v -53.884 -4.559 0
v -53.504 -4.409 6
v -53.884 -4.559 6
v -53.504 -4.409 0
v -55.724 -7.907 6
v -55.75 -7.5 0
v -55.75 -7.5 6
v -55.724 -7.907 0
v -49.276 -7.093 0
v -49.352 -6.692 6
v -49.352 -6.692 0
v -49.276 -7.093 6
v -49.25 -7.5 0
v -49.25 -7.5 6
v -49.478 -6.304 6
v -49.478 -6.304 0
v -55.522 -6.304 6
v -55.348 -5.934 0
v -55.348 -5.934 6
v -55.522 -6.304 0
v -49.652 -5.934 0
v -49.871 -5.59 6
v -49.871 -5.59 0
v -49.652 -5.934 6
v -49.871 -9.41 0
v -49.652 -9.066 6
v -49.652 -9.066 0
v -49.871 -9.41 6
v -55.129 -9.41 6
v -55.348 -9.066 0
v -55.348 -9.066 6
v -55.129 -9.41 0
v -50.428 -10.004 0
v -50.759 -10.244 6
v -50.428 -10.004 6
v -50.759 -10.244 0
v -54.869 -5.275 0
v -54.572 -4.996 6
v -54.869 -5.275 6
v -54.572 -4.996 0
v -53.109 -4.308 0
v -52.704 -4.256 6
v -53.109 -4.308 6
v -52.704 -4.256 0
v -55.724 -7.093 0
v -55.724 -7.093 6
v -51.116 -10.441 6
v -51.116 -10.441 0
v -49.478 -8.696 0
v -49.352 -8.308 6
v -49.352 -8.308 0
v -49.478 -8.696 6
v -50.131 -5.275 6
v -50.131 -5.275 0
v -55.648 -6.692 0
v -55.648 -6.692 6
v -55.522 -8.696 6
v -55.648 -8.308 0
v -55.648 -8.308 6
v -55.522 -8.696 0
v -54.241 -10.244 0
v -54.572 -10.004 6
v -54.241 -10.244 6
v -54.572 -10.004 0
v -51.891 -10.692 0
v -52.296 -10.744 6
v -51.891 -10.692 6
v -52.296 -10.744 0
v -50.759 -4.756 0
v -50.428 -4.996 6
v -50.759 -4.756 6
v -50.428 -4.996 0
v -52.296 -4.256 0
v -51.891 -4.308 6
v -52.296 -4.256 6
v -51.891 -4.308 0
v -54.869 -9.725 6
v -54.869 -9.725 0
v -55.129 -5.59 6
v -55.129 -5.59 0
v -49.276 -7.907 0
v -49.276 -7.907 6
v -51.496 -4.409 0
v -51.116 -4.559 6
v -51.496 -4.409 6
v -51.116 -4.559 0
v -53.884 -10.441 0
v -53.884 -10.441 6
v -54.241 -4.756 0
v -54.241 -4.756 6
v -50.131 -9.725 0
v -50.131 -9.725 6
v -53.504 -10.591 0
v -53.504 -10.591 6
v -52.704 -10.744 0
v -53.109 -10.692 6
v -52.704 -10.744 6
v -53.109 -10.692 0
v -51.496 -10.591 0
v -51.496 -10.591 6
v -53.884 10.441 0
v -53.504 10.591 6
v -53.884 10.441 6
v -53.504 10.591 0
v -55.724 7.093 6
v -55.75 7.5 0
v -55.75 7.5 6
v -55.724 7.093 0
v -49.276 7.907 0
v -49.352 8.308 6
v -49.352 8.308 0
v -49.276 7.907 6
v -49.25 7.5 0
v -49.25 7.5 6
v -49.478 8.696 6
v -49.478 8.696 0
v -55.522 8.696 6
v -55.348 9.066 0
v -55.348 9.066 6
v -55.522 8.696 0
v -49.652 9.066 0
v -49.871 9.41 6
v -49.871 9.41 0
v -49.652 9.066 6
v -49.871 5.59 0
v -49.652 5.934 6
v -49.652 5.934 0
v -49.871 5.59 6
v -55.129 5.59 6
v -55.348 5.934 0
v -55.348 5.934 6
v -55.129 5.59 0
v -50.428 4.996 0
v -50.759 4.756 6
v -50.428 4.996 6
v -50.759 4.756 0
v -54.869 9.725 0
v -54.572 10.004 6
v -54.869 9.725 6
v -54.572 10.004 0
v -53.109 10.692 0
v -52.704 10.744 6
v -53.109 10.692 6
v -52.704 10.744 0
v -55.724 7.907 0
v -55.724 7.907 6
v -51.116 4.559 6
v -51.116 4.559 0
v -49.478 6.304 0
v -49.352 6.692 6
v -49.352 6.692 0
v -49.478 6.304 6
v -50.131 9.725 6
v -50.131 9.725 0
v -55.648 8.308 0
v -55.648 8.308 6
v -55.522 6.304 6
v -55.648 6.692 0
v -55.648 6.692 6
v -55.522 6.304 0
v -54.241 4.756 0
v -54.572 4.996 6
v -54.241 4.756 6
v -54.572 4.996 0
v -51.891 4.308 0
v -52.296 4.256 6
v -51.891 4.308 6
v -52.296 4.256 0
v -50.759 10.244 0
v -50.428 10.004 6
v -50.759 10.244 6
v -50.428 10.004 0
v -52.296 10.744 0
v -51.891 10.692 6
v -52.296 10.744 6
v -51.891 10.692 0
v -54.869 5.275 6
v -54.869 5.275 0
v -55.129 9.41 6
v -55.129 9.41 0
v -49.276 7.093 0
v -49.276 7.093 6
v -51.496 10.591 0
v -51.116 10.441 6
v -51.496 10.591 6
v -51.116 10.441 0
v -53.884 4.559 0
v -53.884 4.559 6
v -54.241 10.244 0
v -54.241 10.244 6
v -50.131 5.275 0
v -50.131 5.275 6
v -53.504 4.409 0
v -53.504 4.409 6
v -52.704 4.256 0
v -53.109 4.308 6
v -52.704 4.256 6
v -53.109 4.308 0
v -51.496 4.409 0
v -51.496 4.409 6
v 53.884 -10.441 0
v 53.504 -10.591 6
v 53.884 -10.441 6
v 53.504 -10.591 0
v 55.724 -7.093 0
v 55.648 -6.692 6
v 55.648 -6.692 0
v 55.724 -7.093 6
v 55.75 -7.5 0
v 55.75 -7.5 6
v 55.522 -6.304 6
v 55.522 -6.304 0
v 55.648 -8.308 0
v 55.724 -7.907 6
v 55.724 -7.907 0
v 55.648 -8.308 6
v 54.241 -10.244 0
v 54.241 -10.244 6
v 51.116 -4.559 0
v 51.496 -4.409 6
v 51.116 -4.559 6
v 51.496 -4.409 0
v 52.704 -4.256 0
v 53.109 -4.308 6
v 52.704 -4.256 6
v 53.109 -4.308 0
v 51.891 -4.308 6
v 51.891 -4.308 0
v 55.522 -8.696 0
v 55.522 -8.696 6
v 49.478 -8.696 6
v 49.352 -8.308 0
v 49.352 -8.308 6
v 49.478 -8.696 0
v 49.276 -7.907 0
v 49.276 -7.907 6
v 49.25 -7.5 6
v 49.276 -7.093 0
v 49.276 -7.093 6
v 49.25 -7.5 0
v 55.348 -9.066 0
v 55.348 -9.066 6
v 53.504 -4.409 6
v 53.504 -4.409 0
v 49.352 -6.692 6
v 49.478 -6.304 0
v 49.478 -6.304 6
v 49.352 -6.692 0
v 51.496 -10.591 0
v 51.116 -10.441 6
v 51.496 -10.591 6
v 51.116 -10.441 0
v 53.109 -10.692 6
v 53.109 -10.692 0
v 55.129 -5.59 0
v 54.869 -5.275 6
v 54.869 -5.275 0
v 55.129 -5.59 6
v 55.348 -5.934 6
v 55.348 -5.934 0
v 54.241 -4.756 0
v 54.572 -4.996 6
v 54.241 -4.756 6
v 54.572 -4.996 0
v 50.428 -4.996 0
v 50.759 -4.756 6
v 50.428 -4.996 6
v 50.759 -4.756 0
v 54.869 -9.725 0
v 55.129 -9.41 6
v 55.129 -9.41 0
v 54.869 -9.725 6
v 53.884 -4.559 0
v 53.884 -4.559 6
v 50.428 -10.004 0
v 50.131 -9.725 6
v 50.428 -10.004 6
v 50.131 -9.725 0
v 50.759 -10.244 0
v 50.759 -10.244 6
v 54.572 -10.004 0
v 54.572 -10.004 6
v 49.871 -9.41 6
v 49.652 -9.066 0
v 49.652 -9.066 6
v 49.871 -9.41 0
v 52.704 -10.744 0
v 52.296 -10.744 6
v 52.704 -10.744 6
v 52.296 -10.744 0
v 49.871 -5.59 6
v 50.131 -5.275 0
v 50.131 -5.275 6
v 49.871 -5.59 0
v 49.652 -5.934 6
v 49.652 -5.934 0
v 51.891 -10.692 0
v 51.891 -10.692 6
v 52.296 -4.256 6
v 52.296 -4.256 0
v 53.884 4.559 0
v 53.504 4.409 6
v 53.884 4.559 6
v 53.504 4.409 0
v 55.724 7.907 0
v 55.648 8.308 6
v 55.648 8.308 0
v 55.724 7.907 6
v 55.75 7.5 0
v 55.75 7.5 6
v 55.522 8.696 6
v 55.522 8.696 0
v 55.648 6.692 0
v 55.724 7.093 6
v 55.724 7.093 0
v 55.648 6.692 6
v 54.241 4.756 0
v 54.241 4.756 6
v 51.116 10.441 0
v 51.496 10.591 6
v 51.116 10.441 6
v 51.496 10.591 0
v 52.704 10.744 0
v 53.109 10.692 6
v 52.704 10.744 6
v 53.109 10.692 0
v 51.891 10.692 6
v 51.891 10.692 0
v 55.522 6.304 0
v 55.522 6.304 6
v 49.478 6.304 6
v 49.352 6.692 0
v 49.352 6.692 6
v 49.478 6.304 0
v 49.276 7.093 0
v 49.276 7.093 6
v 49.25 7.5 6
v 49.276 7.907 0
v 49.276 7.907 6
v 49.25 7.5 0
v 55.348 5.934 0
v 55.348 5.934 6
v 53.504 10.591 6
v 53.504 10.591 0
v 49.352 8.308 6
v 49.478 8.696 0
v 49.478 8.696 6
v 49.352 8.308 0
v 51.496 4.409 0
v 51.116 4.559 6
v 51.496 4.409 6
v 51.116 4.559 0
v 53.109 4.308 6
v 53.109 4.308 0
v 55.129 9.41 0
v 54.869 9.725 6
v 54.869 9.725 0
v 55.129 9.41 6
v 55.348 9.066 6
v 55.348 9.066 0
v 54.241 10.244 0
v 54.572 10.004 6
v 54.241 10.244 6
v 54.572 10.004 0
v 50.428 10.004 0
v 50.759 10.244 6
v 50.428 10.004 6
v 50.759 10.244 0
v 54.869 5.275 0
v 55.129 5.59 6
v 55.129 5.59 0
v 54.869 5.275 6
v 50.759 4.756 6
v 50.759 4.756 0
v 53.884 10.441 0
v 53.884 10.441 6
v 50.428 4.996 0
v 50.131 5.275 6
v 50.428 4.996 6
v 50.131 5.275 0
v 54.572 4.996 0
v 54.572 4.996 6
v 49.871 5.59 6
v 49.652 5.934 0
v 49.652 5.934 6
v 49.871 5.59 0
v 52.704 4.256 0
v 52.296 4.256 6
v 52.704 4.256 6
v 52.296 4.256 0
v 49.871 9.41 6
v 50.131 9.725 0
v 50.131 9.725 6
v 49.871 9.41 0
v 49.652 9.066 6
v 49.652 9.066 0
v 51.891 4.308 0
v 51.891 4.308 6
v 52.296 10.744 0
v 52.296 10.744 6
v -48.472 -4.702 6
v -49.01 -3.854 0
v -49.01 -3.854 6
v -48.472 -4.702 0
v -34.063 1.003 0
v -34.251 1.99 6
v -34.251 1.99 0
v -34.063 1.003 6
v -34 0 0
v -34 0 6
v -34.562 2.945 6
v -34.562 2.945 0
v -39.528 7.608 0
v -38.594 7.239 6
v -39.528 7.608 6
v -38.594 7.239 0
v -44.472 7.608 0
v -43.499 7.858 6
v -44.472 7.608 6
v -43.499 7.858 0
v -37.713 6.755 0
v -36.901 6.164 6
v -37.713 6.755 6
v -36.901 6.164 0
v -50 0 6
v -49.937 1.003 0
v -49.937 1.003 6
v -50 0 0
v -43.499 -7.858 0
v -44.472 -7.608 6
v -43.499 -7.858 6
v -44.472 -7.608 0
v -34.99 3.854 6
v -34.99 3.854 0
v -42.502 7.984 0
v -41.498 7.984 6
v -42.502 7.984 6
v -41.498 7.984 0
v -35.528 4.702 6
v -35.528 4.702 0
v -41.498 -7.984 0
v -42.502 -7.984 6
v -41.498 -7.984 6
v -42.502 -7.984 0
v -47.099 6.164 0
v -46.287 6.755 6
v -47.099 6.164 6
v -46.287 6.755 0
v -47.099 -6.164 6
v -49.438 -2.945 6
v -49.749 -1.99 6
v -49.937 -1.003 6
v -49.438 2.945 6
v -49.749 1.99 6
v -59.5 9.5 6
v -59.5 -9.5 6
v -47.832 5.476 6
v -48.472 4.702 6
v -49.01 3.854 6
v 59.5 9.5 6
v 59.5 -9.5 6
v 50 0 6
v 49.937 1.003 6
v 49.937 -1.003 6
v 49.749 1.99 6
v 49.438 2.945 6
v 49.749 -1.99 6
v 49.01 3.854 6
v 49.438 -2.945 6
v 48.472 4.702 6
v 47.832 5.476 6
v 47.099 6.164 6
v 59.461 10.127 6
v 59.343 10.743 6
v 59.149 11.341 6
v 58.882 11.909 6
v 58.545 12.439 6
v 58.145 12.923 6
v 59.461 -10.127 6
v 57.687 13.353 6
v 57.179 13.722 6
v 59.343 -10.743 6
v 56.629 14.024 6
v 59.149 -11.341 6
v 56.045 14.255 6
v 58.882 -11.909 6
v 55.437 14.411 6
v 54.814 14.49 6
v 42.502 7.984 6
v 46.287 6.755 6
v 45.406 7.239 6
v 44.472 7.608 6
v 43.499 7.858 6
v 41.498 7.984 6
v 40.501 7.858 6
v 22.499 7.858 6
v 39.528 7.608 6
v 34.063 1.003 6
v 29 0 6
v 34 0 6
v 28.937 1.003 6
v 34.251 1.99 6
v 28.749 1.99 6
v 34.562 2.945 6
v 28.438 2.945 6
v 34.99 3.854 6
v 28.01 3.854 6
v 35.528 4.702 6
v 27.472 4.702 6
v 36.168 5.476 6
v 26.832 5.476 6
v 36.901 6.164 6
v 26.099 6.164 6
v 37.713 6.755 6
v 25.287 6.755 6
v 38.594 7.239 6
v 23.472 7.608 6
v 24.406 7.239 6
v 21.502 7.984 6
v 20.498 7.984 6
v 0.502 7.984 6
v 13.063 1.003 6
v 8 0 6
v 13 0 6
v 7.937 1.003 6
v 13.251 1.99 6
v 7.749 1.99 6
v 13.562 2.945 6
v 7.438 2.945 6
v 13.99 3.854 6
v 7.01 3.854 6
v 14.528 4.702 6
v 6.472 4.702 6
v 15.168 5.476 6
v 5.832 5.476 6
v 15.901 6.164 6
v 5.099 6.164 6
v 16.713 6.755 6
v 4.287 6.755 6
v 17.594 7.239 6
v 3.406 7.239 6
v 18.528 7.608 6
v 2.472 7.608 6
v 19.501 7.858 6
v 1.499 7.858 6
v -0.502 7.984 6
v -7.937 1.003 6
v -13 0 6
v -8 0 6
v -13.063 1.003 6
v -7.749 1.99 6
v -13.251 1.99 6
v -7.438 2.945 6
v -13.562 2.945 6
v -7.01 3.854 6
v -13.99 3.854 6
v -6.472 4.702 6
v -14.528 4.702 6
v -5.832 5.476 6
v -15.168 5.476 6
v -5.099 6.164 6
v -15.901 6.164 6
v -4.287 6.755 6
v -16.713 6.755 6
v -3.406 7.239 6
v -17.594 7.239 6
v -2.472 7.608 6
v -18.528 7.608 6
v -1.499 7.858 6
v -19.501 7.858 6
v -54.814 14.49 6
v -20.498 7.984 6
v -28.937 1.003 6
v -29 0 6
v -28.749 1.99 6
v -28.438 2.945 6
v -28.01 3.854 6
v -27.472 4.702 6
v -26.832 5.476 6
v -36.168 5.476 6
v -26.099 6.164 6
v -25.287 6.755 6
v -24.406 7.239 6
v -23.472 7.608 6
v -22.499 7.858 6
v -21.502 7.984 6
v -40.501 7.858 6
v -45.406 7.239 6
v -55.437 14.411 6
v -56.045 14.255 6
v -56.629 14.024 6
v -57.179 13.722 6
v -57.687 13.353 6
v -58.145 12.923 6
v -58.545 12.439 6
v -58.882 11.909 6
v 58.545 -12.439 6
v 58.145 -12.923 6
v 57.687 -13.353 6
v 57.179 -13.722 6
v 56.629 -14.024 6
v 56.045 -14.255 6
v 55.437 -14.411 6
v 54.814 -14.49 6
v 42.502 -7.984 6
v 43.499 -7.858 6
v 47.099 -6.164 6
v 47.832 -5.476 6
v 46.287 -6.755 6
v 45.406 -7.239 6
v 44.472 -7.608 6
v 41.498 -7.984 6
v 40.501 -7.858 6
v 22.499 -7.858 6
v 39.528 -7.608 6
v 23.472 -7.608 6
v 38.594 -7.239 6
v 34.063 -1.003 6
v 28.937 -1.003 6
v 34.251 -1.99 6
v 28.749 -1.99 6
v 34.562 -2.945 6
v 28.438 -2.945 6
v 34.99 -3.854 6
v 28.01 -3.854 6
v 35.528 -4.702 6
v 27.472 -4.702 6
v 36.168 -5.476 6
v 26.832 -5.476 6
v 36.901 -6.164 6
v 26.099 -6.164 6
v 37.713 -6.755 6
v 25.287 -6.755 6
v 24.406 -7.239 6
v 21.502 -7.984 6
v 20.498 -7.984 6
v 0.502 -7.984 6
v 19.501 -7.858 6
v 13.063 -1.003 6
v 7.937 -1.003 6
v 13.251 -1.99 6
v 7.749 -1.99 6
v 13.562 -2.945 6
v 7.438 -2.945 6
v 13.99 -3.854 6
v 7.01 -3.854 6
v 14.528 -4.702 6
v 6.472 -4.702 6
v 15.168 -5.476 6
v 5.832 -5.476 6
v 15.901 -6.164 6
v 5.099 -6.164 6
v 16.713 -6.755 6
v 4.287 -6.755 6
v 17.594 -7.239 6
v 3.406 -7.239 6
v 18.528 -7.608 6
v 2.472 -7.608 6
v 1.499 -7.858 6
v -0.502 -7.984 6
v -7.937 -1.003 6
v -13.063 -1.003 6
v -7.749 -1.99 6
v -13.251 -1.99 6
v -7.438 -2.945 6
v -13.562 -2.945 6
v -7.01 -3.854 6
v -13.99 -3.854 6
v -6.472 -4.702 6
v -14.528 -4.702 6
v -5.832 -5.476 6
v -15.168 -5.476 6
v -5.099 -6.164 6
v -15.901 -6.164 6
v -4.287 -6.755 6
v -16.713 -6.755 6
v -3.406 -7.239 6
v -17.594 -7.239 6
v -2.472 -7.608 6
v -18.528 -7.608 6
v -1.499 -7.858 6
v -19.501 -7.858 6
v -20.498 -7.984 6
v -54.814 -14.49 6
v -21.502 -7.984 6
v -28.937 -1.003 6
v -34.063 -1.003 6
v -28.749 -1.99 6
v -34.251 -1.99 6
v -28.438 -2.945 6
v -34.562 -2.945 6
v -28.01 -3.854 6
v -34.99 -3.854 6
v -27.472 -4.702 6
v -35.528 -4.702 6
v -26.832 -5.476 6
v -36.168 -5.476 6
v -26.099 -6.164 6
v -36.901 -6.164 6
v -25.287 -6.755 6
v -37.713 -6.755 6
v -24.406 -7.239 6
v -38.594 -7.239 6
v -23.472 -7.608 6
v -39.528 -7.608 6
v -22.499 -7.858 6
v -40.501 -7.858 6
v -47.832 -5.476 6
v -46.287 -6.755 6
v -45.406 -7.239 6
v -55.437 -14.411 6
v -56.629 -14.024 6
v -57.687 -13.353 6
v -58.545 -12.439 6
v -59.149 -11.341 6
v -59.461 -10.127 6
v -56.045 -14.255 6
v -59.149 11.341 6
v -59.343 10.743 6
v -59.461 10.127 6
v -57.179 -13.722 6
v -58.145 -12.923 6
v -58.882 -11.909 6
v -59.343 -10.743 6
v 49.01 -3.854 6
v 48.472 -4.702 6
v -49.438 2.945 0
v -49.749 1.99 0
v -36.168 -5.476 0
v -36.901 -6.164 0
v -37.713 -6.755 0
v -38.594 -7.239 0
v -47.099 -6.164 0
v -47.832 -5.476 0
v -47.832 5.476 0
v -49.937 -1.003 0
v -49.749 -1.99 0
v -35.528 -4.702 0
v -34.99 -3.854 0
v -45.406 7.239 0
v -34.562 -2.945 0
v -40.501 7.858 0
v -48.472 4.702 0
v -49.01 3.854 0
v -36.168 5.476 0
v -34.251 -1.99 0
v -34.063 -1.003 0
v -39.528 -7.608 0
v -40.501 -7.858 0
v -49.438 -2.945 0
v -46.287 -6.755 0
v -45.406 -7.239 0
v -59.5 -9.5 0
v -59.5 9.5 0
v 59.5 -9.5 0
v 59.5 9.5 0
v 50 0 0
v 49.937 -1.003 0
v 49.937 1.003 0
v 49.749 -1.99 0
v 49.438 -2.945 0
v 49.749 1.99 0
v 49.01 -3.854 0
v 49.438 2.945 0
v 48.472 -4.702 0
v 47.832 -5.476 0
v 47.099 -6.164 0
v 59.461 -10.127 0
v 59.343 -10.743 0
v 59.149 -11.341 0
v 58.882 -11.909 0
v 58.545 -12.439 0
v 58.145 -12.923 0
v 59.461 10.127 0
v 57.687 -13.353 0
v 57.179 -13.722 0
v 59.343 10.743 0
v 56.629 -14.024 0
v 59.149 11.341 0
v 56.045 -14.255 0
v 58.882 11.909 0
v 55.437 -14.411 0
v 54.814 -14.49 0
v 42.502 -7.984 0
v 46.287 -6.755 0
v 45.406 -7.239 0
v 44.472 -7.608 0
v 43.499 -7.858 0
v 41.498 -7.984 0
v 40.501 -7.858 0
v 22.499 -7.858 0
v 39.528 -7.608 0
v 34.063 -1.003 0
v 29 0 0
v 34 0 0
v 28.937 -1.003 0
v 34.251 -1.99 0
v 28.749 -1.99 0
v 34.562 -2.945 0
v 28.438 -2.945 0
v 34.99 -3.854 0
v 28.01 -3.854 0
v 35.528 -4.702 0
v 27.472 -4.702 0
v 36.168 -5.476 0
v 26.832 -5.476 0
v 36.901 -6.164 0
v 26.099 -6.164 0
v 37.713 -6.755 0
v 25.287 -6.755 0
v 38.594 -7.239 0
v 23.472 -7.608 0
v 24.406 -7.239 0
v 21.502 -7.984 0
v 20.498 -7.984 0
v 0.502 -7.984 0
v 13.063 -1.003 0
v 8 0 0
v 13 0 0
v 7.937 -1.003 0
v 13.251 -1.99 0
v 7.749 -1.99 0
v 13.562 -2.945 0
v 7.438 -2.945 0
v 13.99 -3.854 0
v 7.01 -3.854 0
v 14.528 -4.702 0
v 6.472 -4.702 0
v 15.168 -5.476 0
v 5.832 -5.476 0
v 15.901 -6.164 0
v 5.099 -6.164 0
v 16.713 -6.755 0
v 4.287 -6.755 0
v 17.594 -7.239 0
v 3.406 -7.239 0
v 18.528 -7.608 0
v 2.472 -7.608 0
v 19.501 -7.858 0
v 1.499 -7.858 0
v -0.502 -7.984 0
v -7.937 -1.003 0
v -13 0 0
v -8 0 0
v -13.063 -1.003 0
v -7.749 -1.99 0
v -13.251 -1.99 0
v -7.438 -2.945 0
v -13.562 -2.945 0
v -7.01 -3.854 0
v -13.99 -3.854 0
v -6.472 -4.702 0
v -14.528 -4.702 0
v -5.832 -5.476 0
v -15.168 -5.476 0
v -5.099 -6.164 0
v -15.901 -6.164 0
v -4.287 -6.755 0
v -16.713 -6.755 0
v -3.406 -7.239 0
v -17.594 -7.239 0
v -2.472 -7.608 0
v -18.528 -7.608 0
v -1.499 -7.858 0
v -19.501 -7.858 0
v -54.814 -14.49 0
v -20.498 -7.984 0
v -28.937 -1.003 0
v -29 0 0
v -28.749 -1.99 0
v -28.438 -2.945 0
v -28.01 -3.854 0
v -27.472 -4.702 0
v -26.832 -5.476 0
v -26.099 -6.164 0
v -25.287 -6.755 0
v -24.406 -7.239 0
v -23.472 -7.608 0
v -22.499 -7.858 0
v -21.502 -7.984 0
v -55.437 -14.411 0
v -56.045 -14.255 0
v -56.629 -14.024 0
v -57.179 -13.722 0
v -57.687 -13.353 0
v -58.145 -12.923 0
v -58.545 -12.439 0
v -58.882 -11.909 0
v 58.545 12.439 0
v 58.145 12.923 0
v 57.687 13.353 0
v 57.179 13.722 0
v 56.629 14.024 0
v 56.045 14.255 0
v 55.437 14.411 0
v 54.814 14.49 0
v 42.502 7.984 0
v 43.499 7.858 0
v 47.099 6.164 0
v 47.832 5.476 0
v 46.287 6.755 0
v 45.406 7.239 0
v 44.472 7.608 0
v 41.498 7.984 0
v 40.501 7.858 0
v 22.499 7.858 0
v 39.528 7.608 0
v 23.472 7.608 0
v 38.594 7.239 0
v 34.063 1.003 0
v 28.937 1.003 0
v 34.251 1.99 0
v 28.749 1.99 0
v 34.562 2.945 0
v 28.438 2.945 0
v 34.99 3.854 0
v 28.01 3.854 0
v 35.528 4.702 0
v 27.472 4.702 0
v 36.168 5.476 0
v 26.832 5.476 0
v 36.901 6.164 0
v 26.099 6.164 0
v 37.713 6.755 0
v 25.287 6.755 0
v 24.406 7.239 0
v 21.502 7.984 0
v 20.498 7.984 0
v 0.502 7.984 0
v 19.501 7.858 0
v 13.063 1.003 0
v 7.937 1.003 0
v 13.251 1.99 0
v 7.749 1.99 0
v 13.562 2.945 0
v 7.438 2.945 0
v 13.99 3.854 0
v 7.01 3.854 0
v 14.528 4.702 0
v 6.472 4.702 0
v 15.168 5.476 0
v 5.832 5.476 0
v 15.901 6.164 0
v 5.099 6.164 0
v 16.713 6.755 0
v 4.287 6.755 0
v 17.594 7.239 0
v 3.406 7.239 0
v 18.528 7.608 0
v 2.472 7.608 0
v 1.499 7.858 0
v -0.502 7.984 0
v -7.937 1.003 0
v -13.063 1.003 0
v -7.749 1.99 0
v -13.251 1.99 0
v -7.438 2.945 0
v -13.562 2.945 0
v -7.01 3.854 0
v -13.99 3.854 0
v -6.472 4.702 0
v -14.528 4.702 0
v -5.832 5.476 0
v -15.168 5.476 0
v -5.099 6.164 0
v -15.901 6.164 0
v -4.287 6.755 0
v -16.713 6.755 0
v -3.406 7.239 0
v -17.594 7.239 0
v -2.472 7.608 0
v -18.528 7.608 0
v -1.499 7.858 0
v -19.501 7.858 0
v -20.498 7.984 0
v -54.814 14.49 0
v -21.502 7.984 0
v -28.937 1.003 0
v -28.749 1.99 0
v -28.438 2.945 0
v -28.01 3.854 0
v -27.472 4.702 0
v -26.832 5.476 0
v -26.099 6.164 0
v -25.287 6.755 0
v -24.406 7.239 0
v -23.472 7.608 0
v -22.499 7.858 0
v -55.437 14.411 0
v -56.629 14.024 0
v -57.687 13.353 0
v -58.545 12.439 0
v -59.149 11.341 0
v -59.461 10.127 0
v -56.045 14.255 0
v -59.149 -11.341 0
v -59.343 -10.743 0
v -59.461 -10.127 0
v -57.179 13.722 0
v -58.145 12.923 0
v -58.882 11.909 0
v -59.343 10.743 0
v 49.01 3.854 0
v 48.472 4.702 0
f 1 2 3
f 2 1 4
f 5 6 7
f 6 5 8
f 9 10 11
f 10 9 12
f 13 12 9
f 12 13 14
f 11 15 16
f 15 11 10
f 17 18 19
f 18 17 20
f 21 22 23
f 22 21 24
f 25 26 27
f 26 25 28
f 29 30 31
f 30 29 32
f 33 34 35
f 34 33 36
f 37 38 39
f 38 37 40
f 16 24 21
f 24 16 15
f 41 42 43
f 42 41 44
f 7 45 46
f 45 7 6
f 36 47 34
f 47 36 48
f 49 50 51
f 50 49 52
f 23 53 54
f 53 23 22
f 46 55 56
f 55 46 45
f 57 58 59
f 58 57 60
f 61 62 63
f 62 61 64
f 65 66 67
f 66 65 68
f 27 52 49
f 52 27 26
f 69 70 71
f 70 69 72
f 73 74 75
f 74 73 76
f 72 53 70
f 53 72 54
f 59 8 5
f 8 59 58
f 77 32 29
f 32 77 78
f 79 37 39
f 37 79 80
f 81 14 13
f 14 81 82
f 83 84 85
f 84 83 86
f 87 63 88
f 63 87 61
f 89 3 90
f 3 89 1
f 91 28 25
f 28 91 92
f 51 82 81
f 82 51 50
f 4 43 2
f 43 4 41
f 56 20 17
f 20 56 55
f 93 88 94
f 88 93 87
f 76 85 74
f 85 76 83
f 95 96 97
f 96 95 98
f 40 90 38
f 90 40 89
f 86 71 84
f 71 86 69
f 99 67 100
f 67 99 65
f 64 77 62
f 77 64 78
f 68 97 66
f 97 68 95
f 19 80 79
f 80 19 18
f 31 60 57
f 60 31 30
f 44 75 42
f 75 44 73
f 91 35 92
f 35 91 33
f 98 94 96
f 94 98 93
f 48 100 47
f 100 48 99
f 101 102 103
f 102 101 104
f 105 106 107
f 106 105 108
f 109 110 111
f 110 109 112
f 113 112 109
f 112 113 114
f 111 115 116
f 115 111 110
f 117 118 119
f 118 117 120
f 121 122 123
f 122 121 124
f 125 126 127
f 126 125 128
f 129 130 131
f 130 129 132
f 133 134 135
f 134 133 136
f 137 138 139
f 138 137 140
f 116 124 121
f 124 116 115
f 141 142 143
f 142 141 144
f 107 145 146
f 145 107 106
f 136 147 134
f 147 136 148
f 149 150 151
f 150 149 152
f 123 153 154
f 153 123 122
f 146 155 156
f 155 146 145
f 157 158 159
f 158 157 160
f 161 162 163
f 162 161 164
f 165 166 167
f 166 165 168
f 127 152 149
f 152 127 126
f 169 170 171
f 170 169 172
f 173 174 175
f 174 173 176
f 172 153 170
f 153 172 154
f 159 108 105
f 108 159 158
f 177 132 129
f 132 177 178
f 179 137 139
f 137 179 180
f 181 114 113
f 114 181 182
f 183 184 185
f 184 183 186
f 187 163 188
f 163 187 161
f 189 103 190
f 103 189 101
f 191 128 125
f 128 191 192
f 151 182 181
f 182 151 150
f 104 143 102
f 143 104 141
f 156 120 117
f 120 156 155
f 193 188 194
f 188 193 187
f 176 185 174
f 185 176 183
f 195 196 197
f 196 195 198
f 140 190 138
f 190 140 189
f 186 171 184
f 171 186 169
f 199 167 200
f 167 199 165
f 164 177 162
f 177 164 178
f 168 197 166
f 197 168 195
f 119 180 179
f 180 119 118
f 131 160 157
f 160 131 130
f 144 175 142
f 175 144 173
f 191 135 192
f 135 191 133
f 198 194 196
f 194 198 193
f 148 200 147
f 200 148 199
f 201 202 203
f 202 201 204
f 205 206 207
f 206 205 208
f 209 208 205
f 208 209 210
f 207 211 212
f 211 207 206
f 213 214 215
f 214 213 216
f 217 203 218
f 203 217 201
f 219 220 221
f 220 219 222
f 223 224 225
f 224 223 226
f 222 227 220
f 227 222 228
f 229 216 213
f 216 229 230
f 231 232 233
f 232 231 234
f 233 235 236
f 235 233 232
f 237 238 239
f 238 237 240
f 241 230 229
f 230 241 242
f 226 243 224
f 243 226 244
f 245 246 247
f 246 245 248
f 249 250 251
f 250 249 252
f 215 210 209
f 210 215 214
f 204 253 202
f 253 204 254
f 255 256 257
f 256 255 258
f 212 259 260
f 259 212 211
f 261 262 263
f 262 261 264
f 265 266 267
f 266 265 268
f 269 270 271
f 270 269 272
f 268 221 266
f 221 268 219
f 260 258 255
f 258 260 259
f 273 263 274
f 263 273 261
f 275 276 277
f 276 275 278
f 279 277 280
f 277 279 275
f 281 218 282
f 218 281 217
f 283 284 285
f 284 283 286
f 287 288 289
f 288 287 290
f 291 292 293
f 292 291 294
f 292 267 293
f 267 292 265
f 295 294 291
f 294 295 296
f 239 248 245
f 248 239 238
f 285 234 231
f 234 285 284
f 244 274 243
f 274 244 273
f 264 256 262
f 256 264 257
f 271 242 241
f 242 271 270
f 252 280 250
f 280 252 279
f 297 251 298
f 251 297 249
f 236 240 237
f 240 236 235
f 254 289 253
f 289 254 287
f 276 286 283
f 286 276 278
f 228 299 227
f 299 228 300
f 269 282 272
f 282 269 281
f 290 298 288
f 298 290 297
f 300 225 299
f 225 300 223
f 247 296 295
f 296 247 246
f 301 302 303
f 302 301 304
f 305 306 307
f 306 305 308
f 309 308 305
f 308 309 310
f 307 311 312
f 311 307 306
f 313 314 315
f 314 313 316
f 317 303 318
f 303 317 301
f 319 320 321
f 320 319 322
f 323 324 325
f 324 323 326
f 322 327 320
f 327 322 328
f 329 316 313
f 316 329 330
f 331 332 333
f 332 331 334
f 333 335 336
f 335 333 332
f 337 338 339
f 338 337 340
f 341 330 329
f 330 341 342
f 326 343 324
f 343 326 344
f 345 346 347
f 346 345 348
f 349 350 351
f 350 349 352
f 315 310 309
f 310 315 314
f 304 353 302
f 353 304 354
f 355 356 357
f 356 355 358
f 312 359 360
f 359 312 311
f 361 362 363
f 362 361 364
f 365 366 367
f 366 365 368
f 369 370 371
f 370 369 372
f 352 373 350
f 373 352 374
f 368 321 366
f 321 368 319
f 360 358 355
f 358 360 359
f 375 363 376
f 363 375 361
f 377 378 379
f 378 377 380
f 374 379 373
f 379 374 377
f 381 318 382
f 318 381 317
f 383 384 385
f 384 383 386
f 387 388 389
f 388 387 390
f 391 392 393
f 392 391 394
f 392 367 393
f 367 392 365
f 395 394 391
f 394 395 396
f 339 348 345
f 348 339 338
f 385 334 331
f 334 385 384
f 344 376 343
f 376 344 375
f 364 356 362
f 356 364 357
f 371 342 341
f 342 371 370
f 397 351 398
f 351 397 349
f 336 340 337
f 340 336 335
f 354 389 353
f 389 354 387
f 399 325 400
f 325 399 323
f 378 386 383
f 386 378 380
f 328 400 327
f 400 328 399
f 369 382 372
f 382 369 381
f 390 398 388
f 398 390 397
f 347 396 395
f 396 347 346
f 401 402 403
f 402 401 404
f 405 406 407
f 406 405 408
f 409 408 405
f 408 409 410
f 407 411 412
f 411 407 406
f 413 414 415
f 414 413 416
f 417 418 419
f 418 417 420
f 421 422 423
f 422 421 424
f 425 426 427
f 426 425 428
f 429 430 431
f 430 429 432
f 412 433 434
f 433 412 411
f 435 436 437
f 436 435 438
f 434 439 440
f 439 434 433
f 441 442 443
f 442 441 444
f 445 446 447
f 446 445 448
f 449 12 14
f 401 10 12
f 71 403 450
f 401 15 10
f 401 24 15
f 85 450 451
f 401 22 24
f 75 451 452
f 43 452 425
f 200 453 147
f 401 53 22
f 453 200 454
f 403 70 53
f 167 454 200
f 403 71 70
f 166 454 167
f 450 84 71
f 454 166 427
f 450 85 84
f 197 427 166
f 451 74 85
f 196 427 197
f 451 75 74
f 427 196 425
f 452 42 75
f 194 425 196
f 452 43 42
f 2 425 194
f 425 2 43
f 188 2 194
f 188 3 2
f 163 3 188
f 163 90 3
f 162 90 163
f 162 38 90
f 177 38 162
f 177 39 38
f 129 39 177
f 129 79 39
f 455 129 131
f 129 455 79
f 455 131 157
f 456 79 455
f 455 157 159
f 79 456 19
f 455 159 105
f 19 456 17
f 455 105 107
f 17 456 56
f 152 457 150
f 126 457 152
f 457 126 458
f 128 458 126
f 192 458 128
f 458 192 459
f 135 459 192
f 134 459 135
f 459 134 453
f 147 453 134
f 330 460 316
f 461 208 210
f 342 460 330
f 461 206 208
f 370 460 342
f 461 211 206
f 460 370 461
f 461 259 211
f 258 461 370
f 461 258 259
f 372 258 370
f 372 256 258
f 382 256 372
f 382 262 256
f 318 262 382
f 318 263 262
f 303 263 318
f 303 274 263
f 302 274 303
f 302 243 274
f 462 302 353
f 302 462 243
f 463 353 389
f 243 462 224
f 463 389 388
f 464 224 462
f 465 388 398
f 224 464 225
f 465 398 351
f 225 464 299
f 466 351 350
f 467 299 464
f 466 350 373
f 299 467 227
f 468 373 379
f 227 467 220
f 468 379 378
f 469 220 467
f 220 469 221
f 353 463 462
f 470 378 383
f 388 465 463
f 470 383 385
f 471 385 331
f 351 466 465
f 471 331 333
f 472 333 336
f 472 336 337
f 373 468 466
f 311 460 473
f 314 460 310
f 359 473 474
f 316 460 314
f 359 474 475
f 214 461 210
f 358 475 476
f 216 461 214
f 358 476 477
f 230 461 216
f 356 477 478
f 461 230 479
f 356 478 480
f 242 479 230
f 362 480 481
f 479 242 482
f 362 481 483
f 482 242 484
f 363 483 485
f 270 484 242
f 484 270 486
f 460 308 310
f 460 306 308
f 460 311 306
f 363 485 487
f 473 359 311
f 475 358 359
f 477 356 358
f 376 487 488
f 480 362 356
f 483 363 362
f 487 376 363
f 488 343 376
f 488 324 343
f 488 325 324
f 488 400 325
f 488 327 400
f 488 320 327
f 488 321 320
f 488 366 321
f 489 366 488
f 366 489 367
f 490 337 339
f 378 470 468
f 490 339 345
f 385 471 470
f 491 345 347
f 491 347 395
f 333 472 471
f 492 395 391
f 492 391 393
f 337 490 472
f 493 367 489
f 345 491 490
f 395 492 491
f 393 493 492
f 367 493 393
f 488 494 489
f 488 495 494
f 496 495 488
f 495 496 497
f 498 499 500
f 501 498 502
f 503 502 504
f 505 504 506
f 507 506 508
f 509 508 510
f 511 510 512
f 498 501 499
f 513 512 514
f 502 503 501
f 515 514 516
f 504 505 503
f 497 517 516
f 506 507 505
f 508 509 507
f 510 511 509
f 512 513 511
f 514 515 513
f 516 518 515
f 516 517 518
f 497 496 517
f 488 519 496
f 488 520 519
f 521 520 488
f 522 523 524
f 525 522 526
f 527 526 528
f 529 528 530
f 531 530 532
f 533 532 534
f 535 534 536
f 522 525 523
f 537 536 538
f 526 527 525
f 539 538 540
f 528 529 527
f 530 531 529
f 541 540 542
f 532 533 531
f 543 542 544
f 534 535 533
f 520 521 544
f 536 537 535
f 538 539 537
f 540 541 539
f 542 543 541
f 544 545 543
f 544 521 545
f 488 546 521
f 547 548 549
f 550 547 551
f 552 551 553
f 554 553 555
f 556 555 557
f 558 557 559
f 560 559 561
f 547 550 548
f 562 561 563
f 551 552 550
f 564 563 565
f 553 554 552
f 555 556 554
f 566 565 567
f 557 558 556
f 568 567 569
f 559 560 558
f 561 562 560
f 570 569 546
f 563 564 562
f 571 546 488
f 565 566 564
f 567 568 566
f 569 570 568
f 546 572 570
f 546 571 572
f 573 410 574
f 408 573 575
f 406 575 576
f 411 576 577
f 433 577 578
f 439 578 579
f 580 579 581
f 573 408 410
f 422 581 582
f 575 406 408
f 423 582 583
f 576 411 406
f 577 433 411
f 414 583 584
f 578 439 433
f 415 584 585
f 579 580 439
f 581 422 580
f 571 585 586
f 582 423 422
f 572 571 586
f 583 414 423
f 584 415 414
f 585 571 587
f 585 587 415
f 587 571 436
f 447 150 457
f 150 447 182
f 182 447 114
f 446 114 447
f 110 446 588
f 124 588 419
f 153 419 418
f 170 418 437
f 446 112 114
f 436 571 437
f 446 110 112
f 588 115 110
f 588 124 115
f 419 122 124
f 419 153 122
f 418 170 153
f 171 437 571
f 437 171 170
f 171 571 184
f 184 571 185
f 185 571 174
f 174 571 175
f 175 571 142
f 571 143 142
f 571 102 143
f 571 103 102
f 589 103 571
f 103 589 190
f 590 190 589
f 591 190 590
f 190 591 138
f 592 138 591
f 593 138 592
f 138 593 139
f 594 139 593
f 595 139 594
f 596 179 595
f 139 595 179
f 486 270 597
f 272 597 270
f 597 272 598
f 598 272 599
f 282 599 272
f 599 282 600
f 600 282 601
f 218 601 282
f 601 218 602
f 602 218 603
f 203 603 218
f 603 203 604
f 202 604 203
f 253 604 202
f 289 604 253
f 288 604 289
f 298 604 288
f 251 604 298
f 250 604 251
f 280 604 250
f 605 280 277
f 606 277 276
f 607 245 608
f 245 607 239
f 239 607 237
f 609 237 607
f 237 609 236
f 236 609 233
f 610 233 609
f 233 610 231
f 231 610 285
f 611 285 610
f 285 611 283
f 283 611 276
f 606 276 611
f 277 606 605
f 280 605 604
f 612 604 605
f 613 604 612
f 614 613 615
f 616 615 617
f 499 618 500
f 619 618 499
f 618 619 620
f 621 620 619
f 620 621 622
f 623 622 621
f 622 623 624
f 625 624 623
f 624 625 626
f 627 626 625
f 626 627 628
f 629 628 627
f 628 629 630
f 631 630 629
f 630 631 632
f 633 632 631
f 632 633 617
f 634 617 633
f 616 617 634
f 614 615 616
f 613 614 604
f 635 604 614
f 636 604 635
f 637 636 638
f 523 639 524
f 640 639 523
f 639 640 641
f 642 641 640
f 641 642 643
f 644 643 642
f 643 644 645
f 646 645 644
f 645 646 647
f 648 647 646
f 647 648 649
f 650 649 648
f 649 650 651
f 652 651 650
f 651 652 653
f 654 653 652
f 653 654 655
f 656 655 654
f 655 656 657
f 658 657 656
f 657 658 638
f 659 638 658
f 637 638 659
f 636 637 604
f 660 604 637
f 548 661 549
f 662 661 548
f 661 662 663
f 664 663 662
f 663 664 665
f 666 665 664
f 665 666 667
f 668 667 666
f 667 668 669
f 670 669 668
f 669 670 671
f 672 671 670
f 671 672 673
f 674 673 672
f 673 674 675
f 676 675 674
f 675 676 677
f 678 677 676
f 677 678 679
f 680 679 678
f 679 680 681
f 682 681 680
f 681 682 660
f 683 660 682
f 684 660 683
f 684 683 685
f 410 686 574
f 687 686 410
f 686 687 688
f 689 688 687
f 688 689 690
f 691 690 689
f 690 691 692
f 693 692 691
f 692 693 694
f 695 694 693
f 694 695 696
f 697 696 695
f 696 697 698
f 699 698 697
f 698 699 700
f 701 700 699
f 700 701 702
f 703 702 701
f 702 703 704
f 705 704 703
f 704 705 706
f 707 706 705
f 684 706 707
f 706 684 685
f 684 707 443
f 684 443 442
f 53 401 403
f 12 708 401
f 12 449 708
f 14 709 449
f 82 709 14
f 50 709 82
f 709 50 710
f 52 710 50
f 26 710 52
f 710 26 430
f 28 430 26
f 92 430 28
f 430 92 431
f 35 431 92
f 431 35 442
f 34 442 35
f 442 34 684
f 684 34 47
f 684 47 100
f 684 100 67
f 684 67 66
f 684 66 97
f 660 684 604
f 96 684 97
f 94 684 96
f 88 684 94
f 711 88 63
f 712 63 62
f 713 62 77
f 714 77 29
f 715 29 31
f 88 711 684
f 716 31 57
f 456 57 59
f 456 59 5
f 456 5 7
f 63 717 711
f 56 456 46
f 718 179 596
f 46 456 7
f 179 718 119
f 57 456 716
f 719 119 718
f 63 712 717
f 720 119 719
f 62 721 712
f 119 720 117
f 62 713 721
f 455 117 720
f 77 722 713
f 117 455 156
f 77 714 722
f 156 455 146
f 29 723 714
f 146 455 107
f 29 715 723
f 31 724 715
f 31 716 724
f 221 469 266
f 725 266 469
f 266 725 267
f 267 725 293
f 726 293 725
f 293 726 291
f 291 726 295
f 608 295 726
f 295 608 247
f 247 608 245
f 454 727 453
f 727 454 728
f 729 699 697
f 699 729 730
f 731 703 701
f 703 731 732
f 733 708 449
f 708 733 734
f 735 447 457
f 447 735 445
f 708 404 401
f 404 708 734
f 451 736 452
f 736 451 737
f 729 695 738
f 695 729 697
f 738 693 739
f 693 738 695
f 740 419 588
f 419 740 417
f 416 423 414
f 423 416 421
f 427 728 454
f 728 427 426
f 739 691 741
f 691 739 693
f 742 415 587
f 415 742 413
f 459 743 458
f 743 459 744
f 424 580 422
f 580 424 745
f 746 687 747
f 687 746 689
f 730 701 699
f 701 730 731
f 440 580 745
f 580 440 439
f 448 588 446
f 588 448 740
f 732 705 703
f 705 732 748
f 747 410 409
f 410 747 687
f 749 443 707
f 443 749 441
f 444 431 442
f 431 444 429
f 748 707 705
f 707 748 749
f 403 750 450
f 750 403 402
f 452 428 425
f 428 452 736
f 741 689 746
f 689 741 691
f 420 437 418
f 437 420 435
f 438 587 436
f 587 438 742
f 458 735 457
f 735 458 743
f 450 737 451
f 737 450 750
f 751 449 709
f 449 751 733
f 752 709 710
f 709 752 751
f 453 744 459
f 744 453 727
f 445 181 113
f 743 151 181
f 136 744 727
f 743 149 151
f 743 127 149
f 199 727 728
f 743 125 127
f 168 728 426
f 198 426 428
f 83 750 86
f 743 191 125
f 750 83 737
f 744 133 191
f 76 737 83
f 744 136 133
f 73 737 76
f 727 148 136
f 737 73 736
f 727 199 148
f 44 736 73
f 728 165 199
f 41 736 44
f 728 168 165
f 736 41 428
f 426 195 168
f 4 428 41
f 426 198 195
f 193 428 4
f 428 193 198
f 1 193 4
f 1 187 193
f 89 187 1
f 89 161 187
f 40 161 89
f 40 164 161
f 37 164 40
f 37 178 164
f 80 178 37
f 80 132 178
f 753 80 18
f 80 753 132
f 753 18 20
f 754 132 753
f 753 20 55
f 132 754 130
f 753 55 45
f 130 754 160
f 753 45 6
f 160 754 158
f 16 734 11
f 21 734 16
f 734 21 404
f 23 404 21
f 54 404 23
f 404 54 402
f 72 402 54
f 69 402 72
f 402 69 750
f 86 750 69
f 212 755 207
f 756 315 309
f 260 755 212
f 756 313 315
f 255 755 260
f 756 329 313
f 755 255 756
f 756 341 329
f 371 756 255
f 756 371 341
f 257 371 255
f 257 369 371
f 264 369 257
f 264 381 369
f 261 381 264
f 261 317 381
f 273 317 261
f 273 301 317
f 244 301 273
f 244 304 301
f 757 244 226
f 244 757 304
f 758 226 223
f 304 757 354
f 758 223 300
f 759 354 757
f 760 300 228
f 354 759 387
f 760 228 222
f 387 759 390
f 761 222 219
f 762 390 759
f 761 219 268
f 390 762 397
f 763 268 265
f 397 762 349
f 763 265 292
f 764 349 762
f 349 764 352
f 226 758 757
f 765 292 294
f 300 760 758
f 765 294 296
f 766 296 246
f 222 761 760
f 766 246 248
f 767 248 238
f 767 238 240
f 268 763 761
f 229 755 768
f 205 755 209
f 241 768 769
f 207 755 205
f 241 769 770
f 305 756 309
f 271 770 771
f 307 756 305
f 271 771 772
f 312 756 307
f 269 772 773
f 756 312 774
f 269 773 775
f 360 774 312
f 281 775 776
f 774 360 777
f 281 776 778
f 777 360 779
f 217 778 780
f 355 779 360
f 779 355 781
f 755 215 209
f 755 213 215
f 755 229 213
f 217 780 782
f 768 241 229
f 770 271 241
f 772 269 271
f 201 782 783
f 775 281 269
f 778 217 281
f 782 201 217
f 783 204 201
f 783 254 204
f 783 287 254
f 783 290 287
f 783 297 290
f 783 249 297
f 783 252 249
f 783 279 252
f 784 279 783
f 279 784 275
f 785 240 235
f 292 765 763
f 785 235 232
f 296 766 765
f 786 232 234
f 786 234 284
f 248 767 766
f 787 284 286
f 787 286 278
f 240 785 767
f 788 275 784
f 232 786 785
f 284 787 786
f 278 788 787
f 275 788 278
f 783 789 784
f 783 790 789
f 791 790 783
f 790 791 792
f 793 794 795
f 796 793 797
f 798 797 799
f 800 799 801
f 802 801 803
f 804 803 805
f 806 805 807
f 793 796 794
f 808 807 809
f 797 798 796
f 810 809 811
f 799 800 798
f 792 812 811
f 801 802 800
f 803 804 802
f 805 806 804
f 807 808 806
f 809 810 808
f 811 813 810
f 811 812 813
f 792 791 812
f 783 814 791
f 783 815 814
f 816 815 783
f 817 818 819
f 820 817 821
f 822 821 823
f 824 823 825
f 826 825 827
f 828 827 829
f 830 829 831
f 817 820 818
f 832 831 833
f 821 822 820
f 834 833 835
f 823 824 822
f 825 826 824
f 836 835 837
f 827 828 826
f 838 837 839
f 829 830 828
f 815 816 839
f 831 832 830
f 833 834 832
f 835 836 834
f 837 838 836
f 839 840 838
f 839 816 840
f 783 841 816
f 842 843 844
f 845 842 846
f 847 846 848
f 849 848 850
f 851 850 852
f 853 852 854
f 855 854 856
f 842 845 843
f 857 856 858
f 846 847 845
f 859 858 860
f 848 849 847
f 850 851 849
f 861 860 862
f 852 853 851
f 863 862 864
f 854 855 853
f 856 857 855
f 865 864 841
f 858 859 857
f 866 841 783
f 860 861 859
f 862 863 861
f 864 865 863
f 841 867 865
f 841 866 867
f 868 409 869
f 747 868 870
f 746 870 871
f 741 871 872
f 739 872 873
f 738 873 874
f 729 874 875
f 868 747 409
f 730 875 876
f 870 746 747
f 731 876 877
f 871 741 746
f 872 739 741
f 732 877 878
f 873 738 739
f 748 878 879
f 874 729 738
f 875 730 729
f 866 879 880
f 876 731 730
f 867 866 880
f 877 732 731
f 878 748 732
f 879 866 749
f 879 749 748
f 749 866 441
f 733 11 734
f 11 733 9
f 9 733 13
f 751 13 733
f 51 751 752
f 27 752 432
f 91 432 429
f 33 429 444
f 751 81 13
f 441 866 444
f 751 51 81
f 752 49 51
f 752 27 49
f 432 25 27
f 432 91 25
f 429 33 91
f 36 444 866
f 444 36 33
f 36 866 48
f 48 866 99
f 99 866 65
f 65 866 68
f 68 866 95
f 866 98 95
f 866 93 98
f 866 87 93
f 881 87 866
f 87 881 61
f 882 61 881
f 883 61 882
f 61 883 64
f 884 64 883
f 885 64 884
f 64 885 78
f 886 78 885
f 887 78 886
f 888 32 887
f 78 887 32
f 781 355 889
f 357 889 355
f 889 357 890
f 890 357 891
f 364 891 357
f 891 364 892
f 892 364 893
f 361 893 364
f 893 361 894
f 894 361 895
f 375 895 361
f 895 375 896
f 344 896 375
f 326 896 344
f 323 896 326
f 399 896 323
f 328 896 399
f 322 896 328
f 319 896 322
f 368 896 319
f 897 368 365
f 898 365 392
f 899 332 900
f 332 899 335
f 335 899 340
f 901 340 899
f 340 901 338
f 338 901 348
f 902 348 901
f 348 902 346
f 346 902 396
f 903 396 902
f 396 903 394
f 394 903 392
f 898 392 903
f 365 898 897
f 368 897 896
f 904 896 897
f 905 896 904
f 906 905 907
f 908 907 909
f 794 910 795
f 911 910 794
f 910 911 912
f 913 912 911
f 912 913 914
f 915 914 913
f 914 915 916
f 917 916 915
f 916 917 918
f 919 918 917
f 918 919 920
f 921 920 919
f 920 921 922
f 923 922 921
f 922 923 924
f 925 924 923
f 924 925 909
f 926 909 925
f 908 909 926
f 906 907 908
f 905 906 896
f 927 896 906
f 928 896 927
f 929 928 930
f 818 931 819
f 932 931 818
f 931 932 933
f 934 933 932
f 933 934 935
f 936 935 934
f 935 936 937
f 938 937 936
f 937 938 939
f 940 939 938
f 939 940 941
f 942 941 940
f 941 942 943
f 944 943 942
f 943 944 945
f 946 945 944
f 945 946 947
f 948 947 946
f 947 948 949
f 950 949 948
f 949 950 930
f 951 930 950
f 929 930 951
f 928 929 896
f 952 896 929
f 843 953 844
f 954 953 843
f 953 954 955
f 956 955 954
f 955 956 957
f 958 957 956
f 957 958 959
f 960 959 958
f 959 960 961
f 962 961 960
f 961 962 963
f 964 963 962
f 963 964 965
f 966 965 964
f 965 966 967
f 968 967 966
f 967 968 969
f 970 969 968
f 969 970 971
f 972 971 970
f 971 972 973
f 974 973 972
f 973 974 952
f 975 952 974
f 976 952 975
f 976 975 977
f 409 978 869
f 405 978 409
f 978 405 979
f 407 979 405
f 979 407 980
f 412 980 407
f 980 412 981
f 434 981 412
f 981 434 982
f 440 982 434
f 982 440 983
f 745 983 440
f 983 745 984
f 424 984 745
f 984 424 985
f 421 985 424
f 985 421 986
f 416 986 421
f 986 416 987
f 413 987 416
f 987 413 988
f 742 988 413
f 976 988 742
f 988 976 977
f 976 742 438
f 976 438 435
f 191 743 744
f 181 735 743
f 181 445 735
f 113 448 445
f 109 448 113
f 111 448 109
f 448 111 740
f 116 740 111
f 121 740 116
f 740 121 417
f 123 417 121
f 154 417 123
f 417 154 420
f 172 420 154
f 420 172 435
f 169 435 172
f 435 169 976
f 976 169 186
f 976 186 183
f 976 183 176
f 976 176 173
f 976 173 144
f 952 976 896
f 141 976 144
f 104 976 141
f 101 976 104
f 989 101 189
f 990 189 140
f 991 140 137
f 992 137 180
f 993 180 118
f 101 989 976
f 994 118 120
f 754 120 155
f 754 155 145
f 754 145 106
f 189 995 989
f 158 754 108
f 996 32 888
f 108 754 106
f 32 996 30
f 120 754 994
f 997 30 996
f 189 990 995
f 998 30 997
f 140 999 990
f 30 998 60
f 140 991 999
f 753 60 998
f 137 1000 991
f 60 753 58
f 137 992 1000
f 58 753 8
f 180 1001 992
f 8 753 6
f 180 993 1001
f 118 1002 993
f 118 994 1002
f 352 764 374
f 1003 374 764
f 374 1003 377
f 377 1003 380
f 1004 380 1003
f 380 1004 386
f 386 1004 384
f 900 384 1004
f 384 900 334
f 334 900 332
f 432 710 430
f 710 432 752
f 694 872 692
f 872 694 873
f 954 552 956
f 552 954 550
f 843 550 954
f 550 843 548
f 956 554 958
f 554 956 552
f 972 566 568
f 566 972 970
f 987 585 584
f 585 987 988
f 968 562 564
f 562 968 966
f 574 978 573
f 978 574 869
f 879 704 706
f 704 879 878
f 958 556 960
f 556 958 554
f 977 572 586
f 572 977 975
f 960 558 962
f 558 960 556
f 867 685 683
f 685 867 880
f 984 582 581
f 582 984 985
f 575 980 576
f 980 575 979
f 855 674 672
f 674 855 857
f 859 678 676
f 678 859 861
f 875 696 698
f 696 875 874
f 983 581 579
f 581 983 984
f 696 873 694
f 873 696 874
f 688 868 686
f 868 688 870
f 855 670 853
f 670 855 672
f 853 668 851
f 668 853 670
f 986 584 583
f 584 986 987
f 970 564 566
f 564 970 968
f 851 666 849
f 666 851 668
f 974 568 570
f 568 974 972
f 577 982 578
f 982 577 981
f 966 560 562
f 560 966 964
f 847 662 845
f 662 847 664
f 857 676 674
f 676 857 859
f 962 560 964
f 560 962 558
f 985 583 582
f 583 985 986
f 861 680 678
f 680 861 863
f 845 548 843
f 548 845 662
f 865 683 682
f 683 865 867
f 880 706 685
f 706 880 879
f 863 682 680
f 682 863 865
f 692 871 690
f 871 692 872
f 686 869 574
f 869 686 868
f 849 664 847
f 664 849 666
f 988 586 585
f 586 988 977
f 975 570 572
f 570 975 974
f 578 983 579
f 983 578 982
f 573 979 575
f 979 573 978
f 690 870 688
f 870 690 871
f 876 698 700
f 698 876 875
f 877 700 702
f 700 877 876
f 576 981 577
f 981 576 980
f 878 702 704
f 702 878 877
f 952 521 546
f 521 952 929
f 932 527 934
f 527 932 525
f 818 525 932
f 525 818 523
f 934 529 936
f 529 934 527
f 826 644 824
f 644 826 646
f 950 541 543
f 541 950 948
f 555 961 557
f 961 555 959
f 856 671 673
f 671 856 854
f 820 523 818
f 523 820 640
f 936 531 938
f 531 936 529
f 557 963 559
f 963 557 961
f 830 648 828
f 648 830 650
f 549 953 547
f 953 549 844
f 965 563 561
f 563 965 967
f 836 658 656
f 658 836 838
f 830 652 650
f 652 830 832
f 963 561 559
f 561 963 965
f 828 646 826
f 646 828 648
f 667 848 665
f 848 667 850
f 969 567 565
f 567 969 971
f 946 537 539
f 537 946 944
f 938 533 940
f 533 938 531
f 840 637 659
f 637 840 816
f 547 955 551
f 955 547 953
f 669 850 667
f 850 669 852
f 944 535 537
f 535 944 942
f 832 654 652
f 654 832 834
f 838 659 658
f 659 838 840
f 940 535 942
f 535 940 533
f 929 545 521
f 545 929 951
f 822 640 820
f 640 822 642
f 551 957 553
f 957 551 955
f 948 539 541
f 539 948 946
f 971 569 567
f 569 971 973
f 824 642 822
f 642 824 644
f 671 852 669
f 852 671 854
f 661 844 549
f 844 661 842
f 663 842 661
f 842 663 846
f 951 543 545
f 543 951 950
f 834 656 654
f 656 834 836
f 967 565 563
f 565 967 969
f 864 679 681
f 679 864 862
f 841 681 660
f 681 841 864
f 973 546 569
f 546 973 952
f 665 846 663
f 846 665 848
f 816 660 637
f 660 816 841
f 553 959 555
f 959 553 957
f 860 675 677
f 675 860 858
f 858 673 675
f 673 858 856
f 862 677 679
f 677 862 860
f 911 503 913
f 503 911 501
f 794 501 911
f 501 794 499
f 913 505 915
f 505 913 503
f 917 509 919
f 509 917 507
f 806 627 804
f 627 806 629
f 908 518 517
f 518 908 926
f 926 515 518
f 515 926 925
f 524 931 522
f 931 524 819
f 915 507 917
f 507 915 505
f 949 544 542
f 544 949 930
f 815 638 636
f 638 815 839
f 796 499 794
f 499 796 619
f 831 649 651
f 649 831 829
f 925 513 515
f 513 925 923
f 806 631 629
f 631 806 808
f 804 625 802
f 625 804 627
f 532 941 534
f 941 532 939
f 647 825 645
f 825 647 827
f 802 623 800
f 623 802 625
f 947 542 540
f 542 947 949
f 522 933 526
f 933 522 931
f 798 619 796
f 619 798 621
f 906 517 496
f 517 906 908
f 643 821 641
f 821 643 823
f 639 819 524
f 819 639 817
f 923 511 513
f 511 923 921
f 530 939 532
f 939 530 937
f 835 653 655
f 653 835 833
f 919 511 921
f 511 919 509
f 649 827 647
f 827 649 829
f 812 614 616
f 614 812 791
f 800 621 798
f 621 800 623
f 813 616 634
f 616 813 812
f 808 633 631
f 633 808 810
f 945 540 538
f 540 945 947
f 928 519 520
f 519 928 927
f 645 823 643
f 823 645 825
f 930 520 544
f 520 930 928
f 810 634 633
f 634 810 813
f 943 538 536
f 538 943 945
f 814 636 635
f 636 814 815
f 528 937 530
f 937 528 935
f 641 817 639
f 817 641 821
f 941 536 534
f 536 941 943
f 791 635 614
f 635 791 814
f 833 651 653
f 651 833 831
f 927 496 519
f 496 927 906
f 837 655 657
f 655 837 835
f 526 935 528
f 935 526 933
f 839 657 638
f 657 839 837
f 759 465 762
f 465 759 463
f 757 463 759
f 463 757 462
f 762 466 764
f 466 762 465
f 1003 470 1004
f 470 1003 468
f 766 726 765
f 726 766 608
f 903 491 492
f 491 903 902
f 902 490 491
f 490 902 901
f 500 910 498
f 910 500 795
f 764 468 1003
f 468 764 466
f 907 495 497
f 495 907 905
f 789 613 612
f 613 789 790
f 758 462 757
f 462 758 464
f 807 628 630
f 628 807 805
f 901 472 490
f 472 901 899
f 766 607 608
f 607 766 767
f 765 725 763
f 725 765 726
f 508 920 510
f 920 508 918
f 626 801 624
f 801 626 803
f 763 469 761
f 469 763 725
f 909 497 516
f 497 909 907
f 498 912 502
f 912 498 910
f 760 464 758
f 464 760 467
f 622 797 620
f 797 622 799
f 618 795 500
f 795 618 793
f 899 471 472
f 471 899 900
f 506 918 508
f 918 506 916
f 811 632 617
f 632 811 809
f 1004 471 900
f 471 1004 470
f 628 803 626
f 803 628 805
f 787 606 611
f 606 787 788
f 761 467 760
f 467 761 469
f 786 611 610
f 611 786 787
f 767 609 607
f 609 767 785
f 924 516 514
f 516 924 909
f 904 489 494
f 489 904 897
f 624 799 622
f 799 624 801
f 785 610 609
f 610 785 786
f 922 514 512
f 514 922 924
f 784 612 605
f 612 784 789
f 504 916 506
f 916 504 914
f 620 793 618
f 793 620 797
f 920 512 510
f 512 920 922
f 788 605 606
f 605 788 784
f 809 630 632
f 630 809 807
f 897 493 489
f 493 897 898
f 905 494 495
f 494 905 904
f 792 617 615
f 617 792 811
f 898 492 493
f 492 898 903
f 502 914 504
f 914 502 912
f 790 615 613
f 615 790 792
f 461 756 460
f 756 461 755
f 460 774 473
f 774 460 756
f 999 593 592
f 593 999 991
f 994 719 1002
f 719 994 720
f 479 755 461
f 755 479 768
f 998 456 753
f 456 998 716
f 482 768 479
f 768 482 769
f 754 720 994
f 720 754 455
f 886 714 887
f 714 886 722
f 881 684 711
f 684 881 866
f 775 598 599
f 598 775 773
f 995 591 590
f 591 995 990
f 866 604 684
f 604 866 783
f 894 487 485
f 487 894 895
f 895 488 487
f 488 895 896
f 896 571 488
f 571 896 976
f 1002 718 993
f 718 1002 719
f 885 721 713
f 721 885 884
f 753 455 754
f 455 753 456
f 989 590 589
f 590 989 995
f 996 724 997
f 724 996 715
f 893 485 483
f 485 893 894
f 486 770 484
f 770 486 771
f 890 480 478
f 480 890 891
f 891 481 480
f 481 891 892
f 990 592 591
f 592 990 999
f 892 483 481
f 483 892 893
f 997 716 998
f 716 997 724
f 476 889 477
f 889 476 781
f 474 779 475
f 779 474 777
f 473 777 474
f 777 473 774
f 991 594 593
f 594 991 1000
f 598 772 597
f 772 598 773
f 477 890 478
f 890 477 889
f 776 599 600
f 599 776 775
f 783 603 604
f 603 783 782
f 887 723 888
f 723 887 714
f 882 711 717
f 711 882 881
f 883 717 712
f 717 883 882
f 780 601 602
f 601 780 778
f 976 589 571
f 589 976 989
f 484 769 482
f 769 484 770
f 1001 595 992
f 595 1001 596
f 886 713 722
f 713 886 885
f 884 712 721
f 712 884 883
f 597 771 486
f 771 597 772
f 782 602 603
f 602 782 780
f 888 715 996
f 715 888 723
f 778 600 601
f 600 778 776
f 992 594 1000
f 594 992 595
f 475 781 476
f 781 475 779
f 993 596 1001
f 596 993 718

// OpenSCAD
$fn = 50;

difference() {
	union() {
		hull() {
			translate(v = [-54.5, 9.5, 0]) {
				cylinder(h = 6, r = 5);
			}
			translate(v = [54.5, 9.5, 0]) {
				cylinder(h = 6, r = 5);
			}
			translate(v = [-54.5, -9.5, 0]) {
				cylinder(h = 6, r = 5);
			}
			translate(v = [54.5, -9.5, 0]) {
				cylinder(h = 6, r = 5);
			}
		}
	}
	union() {
		translate(v = [-52.5, -7.5, -100.0]) {
			cylinder(h = 200, r = 3.25);
		}
		translate(v = [-52.5, 7.5, -100.0]) {
			cylinder(h = 200, r = 3.25);
		}
		translate(v = [52.5, -7.5, -100.0]) {
			cylinder(h = 200, r = 3.25);
		}
		translate(v = [52.5, 7.5, -100.0]) {
			cylinder(h = 200, r = 3.25);
		}
		translate(v = [-52.5, -7.5, -100.0]) {
			cylinder(h = 200, r = 1.8);
		}
		translate(v = [-52.5, 7.5, -100.0]) {
			cylinder(h = 200, r = 1.8);
		}
		translate(v = [52.5, -7.5, -100.0]) {
			cylinder(h = 200, r = 1.8);
		}
		translate(v = [52.5, 7.5, -100.0]) {
			cylinder(h = 200, r = 1.8);
		}
		translate(v = [-42.0, 0, 0.0]) {
			cylinder(h = 6, r = 8.0);
		}
		translate(v = [-21.0, 0, 0.0]) {
			cylinder(h = 6, r = 8.0);
		}
		cylinder(h = 6, r = 8.0);
		translate(v = [21.0, 0, 0.0]) {
			cylinder(h = 6, r = 8.0);
		}
		translate(v = [42.0, 0, 0.0]) {
			cylinder(h = 6, r = 8.0);
		}
	}
}
